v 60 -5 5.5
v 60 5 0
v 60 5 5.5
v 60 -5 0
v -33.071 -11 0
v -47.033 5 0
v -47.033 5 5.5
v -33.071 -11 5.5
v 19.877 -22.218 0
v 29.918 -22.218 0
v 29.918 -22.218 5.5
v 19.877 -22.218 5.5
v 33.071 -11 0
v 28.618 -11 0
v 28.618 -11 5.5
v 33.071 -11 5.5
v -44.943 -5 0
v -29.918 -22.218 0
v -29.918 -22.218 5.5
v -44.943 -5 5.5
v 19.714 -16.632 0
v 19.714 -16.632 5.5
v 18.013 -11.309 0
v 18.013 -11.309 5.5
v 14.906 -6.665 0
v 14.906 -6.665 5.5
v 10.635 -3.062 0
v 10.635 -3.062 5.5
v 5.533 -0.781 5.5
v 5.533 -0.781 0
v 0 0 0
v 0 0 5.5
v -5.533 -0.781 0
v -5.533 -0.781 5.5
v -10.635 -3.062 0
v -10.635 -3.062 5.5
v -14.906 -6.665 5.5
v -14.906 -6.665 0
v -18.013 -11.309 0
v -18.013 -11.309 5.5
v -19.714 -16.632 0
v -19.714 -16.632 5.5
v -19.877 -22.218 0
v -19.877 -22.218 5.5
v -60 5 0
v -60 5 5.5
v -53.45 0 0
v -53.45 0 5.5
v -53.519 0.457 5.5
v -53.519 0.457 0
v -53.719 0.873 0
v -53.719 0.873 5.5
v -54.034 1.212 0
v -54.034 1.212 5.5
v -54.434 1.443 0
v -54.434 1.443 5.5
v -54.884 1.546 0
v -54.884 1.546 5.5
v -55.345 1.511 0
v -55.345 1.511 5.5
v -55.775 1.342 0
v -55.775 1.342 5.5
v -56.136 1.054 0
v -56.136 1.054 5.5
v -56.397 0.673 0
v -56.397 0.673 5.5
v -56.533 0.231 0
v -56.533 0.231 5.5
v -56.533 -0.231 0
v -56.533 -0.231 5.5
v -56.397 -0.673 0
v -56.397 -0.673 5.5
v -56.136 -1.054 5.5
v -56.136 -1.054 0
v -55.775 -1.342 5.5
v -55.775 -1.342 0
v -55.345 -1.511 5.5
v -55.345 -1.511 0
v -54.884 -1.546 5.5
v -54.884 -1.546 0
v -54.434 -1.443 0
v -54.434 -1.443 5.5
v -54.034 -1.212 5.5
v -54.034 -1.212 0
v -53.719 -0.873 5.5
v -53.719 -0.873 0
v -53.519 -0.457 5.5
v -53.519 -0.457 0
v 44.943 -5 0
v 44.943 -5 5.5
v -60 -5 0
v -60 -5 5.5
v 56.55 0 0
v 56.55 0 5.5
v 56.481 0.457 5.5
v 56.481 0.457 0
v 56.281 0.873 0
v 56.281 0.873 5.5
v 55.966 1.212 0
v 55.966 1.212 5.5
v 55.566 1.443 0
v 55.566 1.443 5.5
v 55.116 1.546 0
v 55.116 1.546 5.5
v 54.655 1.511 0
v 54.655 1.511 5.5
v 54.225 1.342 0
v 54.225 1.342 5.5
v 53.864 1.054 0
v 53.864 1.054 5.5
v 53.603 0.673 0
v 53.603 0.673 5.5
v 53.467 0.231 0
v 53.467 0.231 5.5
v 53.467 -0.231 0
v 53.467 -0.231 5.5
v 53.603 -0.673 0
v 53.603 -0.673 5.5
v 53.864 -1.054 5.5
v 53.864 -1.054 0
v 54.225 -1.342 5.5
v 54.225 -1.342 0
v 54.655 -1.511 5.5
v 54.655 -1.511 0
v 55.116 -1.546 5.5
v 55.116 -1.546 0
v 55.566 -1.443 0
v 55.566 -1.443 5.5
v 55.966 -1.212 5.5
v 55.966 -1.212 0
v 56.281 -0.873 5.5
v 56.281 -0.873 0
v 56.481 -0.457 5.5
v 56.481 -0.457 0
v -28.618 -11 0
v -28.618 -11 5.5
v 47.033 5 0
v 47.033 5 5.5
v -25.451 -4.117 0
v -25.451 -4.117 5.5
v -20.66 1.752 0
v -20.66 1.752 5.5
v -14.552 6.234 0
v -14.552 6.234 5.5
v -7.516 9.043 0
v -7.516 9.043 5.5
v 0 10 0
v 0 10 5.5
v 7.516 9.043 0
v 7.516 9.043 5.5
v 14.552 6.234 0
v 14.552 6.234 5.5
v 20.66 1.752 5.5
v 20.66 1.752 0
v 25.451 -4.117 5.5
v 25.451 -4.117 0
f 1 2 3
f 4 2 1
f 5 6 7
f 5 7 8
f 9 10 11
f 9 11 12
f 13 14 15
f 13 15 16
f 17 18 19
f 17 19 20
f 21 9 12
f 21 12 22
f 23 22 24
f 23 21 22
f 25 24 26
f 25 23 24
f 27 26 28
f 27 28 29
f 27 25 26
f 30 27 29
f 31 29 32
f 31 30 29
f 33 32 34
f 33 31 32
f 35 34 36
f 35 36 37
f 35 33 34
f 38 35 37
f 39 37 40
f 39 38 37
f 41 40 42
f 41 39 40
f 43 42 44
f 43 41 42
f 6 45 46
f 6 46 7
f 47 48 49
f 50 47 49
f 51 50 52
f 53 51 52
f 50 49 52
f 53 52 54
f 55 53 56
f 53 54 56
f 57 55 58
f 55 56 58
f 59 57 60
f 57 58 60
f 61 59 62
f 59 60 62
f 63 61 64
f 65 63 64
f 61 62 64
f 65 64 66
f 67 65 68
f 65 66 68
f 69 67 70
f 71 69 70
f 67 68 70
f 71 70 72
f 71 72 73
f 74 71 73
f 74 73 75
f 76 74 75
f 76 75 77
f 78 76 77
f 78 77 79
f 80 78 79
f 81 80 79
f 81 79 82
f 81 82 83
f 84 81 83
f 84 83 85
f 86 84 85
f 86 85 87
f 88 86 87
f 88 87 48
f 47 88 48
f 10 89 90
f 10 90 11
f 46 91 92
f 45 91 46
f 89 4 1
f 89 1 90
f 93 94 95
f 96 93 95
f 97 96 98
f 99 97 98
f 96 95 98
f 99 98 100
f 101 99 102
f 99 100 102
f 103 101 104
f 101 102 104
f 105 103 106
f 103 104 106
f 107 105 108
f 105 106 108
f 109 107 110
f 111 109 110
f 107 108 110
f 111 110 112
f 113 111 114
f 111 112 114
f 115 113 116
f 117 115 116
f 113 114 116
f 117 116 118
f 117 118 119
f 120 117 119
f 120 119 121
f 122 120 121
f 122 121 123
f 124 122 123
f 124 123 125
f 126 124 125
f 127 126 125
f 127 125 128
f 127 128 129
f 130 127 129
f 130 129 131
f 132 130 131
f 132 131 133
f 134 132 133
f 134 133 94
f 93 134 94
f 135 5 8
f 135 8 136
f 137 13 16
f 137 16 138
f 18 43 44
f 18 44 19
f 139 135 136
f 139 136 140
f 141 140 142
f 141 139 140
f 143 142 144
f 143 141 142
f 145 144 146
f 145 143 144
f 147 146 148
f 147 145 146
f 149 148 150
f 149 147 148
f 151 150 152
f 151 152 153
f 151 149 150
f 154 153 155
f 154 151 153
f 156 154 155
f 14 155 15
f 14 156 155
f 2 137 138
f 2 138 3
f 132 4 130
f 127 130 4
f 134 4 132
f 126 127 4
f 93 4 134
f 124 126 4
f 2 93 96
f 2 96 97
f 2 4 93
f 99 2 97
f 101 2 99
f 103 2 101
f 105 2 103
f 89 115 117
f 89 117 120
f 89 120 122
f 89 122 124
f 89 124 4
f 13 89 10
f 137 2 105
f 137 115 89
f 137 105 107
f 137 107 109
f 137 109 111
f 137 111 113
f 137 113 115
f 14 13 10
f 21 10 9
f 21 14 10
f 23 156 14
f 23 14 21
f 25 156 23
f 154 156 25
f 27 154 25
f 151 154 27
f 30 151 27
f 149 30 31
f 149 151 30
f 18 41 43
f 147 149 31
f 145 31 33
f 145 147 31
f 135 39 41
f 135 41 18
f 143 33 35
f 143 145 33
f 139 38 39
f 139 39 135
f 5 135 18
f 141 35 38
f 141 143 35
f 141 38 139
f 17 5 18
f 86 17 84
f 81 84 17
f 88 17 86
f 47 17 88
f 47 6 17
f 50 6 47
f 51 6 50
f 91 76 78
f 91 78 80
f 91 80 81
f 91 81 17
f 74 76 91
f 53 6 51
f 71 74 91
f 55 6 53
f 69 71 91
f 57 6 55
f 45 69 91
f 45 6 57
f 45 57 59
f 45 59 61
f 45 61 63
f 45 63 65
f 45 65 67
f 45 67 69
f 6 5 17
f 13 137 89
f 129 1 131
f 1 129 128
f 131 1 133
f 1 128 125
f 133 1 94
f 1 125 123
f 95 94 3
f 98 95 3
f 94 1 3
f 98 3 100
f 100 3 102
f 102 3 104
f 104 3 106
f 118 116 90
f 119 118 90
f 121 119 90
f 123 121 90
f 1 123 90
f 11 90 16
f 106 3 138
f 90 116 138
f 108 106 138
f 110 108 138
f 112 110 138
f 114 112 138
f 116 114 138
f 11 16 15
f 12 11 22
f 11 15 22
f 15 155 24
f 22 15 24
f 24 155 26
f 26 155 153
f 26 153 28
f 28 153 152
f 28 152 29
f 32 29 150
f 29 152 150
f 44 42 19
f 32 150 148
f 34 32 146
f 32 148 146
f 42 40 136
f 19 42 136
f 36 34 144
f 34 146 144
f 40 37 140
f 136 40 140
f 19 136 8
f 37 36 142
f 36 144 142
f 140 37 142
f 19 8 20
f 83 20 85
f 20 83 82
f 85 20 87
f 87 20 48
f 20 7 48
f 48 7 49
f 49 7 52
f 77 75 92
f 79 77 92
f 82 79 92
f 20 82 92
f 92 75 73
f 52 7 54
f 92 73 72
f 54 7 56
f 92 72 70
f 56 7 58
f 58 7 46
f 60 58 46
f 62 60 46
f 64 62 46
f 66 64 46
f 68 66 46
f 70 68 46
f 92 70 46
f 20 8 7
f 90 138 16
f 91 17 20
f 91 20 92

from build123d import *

# Parameters (mm, degrees)
EXTRUDE_1_DEPTH     = 5.5
SKETCH_2_R          = 1.55
CUT_EXTRUDE_1_DEPTH = 65.217448119


with BuildPart() as part:
    # ｽｹｯﾁ1 → ﾎﾞｽ - 押し出し1 (new body)
    with BuildSketch(Plane.XY):
        with BuildLine():
            Line((-60, 5), (-47.033321686, 5))
            Line((-47.033321686, 5), (-33.07098347, -11))
            Line((-33.07098347, -11), (-28.618176043, -11))
            ThreePointArc((-28.618176043, -11), (0, 10), (28.618176043, -11))
            Line((28.618176043, -11), (33.07098347, -11))
            Line((33.07098347, -11), (47.033321686, 5))
            Line((47.033321686, 5), (60, 5))
            Line((60, 5), (60, -5))
            Line((60, -5), (44.942957201, -5))
            Line((44.942957201, -5), (29.917910397, -22.217800138))
            Line((29.917910397, -22.217800138), (19.876653706, -22.217800138))
            ThreePointArc((19.876653706, -22.217800138), (0, 0), (-19.876653706, -22.217800138))
            Line((-19.876653706, -22.217800138), (-29.917910397, -22.217800138))
            Line((-29.917910397, -22.217800138), (-44.942957201, -5))
            Line((-44.942957201, -5), (-60, -5))
            Line((-60, -5), (-60, 5))
        make_face()
    extrude(amount=EXTRUDE_1_DEPTH)

    # ｽｹｯﾁ2 → ｶｯﾄ - 押し出し1 (cut, through all)
    with BuildSketch(Plane.XY.offset(5.5)):
        with Locations((-55, 0)):
            Circle(SKETCH_2_R)
        with Locations((55, 0)):
            Circle(SKETCH_2_R)
    extrude(amount=-CUT_EXTRUDE_1_DEPTH, mode=Mode.SUBTRACT)


solid = part.part
